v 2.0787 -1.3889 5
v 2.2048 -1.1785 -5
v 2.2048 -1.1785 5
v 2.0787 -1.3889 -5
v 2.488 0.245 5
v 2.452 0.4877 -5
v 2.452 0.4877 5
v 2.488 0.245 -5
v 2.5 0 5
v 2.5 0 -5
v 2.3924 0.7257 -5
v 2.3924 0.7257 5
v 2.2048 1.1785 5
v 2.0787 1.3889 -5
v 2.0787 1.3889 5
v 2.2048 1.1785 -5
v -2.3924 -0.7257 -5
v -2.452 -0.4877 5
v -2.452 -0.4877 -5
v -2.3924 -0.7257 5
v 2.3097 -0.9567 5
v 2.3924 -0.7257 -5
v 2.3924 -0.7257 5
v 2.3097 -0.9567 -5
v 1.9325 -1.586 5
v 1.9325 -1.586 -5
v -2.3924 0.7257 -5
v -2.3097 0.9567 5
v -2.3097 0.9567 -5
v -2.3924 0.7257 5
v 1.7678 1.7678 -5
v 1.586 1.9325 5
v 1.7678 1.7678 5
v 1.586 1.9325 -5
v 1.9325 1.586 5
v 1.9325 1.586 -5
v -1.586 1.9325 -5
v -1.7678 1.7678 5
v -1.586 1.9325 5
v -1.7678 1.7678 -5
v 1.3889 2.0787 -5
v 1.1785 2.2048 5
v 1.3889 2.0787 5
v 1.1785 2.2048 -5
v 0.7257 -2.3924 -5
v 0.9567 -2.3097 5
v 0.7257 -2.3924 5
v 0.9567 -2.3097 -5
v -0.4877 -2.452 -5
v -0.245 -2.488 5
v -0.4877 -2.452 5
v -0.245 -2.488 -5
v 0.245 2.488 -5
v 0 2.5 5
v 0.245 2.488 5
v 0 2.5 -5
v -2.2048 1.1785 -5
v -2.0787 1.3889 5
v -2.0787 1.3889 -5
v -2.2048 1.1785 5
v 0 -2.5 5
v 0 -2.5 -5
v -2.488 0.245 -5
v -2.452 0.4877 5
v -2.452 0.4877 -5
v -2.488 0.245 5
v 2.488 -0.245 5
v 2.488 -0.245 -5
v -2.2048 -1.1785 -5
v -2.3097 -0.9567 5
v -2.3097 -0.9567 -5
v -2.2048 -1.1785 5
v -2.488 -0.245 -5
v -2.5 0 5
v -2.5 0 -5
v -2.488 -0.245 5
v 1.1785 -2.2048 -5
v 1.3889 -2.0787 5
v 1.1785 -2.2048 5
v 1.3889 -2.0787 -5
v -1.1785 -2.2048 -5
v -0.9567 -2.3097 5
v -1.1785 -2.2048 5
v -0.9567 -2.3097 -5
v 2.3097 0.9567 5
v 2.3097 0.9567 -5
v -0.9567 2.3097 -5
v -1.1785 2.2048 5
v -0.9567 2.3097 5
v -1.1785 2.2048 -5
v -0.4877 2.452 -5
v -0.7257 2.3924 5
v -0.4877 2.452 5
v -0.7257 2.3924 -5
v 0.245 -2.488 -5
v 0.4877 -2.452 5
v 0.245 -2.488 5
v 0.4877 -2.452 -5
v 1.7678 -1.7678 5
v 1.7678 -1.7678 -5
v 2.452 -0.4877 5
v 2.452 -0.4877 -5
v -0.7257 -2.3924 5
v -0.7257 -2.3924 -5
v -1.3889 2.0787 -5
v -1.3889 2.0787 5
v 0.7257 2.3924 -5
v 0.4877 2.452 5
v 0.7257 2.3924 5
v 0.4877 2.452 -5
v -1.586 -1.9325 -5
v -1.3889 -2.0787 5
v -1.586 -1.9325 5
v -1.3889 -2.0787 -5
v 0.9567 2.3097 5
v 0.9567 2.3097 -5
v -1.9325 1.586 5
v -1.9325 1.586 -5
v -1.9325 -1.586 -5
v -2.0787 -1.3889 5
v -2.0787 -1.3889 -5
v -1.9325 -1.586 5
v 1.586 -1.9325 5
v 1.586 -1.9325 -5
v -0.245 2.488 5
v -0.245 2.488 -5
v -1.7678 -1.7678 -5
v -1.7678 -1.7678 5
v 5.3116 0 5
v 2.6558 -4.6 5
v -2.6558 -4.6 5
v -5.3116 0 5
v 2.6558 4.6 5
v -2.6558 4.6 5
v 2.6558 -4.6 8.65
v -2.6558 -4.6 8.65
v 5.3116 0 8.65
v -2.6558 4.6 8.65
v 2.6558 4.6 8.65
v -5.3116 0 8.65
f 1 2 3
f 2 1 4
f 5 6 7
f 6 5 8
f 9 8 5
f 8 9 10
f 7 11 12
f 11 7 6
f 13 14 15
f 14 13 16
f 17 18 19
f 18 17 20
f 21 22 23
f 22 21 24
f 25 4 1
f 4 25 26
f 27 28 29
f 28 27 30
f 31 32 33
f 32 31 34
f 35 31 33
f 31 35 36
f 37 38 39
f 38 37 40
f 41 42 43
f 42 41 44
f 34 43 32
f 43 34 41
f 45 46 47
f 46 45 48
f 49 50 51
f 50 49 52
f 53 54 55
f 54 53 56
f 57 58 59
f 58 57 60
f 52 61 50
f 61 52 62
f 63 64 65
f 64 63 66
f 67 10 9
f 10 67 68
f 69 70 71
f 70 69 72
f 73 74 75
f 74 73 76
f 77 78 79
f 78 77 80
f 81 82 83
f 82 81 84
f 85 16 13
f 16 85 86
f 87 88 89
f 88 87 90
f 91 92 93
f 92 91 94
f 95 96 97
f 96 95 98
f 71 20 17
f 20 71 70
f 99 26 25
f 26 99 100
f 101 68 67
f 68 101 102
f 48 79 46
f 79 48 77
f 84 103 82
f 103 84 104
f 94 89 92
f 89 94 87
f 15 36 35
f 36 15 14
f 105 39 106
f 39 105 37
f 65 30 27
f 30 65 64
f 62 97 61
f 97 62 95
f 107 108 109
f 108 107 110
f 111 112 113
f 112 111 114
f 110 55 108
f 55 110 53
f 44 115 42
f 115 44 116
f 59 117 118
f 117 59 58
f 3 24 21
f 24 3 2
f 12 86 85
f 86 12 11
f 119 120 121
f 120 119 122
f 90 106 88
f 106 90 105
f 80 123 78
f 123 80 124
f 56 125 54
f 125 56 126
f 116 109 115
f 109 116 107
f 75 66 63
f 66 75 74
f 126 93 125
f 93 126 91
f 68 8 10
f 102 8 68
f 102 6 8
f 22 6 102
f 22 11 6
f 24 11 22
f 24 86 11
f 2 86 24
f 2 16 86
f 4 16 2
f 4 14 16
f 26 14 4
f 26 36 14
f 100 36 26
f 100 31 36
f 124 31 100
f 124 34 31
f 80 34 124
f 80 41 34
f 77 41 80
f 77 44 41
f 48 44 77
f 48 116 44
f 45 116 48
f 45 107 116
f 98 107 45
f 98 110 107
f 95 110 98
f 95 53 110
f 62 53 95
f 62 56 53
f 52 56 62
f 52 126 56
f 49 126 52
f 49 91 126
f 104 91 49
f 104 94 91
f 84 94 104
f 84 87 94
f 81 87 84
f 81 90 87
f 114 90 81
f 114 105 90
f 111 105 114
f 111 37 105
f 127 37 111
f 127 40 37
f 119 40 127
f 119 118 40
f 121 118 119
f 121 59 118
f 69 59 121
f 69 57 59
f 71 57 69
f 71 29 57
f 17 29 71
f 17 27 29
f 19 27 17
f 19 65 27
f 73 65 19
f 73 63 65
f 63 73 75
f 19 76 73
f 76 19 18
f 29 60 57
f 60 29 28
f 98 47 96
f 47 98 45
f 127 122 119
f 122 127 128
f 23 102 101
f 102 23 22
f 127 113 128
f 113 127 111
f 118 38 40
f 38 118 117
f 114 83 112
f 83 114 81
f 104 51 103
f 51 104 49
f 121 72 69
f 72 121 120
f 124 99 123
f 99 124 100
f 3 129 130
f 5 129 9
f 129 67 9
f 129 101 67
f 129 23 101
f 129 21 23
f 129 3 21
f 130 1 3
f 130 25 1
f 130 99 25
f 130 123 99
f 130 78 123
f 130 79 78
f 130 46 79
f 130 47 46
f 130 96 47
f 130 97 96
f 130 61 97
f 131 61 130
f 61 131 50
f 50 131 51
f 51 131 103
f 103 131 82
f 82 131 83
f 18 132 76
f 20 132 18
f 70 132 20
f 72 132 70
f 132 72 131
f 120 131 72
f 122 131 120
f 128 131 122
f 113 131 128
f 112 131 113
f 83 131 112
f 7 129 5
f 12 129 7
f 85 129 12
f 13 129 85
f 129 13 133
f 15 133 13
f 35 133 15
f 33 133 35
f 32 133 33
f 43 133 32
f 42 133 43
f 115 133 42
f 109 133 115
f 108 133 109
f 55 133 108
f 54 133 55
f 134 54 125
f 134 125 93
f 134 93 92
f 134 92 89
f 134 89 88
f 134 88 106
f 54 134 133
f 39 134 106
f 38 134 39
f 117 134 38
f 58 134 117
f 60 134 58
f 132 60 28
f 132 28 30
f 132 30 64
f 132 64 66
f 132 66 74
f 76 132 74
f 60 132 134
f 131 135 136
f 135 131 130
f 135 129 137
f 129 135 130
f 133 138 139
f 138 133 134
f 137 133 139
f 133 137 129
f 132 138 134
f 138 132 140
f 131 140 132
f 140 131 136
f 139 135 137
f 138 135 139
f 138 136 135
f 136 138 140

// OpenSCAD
$fn=64;

d_shaft = 5.0;
len_shaft = 10.0;

head_flat_d = 9.2;
head_h = 3.65;

module hex_prism(flat_d, h){
    r = flat_d / sqrt(3);
    cylinder(h=h, r=r, $fn=6);
}

module screw(){
    union(){
        translate([0,0,-len_shaft/2])
            cylinder(h=len_shaft, d=d_shaft, $fn=64);
        translate([0,0,len_shaft/2])
            hex_prism(head_flat_d, head_h);
    }
}

screw();
